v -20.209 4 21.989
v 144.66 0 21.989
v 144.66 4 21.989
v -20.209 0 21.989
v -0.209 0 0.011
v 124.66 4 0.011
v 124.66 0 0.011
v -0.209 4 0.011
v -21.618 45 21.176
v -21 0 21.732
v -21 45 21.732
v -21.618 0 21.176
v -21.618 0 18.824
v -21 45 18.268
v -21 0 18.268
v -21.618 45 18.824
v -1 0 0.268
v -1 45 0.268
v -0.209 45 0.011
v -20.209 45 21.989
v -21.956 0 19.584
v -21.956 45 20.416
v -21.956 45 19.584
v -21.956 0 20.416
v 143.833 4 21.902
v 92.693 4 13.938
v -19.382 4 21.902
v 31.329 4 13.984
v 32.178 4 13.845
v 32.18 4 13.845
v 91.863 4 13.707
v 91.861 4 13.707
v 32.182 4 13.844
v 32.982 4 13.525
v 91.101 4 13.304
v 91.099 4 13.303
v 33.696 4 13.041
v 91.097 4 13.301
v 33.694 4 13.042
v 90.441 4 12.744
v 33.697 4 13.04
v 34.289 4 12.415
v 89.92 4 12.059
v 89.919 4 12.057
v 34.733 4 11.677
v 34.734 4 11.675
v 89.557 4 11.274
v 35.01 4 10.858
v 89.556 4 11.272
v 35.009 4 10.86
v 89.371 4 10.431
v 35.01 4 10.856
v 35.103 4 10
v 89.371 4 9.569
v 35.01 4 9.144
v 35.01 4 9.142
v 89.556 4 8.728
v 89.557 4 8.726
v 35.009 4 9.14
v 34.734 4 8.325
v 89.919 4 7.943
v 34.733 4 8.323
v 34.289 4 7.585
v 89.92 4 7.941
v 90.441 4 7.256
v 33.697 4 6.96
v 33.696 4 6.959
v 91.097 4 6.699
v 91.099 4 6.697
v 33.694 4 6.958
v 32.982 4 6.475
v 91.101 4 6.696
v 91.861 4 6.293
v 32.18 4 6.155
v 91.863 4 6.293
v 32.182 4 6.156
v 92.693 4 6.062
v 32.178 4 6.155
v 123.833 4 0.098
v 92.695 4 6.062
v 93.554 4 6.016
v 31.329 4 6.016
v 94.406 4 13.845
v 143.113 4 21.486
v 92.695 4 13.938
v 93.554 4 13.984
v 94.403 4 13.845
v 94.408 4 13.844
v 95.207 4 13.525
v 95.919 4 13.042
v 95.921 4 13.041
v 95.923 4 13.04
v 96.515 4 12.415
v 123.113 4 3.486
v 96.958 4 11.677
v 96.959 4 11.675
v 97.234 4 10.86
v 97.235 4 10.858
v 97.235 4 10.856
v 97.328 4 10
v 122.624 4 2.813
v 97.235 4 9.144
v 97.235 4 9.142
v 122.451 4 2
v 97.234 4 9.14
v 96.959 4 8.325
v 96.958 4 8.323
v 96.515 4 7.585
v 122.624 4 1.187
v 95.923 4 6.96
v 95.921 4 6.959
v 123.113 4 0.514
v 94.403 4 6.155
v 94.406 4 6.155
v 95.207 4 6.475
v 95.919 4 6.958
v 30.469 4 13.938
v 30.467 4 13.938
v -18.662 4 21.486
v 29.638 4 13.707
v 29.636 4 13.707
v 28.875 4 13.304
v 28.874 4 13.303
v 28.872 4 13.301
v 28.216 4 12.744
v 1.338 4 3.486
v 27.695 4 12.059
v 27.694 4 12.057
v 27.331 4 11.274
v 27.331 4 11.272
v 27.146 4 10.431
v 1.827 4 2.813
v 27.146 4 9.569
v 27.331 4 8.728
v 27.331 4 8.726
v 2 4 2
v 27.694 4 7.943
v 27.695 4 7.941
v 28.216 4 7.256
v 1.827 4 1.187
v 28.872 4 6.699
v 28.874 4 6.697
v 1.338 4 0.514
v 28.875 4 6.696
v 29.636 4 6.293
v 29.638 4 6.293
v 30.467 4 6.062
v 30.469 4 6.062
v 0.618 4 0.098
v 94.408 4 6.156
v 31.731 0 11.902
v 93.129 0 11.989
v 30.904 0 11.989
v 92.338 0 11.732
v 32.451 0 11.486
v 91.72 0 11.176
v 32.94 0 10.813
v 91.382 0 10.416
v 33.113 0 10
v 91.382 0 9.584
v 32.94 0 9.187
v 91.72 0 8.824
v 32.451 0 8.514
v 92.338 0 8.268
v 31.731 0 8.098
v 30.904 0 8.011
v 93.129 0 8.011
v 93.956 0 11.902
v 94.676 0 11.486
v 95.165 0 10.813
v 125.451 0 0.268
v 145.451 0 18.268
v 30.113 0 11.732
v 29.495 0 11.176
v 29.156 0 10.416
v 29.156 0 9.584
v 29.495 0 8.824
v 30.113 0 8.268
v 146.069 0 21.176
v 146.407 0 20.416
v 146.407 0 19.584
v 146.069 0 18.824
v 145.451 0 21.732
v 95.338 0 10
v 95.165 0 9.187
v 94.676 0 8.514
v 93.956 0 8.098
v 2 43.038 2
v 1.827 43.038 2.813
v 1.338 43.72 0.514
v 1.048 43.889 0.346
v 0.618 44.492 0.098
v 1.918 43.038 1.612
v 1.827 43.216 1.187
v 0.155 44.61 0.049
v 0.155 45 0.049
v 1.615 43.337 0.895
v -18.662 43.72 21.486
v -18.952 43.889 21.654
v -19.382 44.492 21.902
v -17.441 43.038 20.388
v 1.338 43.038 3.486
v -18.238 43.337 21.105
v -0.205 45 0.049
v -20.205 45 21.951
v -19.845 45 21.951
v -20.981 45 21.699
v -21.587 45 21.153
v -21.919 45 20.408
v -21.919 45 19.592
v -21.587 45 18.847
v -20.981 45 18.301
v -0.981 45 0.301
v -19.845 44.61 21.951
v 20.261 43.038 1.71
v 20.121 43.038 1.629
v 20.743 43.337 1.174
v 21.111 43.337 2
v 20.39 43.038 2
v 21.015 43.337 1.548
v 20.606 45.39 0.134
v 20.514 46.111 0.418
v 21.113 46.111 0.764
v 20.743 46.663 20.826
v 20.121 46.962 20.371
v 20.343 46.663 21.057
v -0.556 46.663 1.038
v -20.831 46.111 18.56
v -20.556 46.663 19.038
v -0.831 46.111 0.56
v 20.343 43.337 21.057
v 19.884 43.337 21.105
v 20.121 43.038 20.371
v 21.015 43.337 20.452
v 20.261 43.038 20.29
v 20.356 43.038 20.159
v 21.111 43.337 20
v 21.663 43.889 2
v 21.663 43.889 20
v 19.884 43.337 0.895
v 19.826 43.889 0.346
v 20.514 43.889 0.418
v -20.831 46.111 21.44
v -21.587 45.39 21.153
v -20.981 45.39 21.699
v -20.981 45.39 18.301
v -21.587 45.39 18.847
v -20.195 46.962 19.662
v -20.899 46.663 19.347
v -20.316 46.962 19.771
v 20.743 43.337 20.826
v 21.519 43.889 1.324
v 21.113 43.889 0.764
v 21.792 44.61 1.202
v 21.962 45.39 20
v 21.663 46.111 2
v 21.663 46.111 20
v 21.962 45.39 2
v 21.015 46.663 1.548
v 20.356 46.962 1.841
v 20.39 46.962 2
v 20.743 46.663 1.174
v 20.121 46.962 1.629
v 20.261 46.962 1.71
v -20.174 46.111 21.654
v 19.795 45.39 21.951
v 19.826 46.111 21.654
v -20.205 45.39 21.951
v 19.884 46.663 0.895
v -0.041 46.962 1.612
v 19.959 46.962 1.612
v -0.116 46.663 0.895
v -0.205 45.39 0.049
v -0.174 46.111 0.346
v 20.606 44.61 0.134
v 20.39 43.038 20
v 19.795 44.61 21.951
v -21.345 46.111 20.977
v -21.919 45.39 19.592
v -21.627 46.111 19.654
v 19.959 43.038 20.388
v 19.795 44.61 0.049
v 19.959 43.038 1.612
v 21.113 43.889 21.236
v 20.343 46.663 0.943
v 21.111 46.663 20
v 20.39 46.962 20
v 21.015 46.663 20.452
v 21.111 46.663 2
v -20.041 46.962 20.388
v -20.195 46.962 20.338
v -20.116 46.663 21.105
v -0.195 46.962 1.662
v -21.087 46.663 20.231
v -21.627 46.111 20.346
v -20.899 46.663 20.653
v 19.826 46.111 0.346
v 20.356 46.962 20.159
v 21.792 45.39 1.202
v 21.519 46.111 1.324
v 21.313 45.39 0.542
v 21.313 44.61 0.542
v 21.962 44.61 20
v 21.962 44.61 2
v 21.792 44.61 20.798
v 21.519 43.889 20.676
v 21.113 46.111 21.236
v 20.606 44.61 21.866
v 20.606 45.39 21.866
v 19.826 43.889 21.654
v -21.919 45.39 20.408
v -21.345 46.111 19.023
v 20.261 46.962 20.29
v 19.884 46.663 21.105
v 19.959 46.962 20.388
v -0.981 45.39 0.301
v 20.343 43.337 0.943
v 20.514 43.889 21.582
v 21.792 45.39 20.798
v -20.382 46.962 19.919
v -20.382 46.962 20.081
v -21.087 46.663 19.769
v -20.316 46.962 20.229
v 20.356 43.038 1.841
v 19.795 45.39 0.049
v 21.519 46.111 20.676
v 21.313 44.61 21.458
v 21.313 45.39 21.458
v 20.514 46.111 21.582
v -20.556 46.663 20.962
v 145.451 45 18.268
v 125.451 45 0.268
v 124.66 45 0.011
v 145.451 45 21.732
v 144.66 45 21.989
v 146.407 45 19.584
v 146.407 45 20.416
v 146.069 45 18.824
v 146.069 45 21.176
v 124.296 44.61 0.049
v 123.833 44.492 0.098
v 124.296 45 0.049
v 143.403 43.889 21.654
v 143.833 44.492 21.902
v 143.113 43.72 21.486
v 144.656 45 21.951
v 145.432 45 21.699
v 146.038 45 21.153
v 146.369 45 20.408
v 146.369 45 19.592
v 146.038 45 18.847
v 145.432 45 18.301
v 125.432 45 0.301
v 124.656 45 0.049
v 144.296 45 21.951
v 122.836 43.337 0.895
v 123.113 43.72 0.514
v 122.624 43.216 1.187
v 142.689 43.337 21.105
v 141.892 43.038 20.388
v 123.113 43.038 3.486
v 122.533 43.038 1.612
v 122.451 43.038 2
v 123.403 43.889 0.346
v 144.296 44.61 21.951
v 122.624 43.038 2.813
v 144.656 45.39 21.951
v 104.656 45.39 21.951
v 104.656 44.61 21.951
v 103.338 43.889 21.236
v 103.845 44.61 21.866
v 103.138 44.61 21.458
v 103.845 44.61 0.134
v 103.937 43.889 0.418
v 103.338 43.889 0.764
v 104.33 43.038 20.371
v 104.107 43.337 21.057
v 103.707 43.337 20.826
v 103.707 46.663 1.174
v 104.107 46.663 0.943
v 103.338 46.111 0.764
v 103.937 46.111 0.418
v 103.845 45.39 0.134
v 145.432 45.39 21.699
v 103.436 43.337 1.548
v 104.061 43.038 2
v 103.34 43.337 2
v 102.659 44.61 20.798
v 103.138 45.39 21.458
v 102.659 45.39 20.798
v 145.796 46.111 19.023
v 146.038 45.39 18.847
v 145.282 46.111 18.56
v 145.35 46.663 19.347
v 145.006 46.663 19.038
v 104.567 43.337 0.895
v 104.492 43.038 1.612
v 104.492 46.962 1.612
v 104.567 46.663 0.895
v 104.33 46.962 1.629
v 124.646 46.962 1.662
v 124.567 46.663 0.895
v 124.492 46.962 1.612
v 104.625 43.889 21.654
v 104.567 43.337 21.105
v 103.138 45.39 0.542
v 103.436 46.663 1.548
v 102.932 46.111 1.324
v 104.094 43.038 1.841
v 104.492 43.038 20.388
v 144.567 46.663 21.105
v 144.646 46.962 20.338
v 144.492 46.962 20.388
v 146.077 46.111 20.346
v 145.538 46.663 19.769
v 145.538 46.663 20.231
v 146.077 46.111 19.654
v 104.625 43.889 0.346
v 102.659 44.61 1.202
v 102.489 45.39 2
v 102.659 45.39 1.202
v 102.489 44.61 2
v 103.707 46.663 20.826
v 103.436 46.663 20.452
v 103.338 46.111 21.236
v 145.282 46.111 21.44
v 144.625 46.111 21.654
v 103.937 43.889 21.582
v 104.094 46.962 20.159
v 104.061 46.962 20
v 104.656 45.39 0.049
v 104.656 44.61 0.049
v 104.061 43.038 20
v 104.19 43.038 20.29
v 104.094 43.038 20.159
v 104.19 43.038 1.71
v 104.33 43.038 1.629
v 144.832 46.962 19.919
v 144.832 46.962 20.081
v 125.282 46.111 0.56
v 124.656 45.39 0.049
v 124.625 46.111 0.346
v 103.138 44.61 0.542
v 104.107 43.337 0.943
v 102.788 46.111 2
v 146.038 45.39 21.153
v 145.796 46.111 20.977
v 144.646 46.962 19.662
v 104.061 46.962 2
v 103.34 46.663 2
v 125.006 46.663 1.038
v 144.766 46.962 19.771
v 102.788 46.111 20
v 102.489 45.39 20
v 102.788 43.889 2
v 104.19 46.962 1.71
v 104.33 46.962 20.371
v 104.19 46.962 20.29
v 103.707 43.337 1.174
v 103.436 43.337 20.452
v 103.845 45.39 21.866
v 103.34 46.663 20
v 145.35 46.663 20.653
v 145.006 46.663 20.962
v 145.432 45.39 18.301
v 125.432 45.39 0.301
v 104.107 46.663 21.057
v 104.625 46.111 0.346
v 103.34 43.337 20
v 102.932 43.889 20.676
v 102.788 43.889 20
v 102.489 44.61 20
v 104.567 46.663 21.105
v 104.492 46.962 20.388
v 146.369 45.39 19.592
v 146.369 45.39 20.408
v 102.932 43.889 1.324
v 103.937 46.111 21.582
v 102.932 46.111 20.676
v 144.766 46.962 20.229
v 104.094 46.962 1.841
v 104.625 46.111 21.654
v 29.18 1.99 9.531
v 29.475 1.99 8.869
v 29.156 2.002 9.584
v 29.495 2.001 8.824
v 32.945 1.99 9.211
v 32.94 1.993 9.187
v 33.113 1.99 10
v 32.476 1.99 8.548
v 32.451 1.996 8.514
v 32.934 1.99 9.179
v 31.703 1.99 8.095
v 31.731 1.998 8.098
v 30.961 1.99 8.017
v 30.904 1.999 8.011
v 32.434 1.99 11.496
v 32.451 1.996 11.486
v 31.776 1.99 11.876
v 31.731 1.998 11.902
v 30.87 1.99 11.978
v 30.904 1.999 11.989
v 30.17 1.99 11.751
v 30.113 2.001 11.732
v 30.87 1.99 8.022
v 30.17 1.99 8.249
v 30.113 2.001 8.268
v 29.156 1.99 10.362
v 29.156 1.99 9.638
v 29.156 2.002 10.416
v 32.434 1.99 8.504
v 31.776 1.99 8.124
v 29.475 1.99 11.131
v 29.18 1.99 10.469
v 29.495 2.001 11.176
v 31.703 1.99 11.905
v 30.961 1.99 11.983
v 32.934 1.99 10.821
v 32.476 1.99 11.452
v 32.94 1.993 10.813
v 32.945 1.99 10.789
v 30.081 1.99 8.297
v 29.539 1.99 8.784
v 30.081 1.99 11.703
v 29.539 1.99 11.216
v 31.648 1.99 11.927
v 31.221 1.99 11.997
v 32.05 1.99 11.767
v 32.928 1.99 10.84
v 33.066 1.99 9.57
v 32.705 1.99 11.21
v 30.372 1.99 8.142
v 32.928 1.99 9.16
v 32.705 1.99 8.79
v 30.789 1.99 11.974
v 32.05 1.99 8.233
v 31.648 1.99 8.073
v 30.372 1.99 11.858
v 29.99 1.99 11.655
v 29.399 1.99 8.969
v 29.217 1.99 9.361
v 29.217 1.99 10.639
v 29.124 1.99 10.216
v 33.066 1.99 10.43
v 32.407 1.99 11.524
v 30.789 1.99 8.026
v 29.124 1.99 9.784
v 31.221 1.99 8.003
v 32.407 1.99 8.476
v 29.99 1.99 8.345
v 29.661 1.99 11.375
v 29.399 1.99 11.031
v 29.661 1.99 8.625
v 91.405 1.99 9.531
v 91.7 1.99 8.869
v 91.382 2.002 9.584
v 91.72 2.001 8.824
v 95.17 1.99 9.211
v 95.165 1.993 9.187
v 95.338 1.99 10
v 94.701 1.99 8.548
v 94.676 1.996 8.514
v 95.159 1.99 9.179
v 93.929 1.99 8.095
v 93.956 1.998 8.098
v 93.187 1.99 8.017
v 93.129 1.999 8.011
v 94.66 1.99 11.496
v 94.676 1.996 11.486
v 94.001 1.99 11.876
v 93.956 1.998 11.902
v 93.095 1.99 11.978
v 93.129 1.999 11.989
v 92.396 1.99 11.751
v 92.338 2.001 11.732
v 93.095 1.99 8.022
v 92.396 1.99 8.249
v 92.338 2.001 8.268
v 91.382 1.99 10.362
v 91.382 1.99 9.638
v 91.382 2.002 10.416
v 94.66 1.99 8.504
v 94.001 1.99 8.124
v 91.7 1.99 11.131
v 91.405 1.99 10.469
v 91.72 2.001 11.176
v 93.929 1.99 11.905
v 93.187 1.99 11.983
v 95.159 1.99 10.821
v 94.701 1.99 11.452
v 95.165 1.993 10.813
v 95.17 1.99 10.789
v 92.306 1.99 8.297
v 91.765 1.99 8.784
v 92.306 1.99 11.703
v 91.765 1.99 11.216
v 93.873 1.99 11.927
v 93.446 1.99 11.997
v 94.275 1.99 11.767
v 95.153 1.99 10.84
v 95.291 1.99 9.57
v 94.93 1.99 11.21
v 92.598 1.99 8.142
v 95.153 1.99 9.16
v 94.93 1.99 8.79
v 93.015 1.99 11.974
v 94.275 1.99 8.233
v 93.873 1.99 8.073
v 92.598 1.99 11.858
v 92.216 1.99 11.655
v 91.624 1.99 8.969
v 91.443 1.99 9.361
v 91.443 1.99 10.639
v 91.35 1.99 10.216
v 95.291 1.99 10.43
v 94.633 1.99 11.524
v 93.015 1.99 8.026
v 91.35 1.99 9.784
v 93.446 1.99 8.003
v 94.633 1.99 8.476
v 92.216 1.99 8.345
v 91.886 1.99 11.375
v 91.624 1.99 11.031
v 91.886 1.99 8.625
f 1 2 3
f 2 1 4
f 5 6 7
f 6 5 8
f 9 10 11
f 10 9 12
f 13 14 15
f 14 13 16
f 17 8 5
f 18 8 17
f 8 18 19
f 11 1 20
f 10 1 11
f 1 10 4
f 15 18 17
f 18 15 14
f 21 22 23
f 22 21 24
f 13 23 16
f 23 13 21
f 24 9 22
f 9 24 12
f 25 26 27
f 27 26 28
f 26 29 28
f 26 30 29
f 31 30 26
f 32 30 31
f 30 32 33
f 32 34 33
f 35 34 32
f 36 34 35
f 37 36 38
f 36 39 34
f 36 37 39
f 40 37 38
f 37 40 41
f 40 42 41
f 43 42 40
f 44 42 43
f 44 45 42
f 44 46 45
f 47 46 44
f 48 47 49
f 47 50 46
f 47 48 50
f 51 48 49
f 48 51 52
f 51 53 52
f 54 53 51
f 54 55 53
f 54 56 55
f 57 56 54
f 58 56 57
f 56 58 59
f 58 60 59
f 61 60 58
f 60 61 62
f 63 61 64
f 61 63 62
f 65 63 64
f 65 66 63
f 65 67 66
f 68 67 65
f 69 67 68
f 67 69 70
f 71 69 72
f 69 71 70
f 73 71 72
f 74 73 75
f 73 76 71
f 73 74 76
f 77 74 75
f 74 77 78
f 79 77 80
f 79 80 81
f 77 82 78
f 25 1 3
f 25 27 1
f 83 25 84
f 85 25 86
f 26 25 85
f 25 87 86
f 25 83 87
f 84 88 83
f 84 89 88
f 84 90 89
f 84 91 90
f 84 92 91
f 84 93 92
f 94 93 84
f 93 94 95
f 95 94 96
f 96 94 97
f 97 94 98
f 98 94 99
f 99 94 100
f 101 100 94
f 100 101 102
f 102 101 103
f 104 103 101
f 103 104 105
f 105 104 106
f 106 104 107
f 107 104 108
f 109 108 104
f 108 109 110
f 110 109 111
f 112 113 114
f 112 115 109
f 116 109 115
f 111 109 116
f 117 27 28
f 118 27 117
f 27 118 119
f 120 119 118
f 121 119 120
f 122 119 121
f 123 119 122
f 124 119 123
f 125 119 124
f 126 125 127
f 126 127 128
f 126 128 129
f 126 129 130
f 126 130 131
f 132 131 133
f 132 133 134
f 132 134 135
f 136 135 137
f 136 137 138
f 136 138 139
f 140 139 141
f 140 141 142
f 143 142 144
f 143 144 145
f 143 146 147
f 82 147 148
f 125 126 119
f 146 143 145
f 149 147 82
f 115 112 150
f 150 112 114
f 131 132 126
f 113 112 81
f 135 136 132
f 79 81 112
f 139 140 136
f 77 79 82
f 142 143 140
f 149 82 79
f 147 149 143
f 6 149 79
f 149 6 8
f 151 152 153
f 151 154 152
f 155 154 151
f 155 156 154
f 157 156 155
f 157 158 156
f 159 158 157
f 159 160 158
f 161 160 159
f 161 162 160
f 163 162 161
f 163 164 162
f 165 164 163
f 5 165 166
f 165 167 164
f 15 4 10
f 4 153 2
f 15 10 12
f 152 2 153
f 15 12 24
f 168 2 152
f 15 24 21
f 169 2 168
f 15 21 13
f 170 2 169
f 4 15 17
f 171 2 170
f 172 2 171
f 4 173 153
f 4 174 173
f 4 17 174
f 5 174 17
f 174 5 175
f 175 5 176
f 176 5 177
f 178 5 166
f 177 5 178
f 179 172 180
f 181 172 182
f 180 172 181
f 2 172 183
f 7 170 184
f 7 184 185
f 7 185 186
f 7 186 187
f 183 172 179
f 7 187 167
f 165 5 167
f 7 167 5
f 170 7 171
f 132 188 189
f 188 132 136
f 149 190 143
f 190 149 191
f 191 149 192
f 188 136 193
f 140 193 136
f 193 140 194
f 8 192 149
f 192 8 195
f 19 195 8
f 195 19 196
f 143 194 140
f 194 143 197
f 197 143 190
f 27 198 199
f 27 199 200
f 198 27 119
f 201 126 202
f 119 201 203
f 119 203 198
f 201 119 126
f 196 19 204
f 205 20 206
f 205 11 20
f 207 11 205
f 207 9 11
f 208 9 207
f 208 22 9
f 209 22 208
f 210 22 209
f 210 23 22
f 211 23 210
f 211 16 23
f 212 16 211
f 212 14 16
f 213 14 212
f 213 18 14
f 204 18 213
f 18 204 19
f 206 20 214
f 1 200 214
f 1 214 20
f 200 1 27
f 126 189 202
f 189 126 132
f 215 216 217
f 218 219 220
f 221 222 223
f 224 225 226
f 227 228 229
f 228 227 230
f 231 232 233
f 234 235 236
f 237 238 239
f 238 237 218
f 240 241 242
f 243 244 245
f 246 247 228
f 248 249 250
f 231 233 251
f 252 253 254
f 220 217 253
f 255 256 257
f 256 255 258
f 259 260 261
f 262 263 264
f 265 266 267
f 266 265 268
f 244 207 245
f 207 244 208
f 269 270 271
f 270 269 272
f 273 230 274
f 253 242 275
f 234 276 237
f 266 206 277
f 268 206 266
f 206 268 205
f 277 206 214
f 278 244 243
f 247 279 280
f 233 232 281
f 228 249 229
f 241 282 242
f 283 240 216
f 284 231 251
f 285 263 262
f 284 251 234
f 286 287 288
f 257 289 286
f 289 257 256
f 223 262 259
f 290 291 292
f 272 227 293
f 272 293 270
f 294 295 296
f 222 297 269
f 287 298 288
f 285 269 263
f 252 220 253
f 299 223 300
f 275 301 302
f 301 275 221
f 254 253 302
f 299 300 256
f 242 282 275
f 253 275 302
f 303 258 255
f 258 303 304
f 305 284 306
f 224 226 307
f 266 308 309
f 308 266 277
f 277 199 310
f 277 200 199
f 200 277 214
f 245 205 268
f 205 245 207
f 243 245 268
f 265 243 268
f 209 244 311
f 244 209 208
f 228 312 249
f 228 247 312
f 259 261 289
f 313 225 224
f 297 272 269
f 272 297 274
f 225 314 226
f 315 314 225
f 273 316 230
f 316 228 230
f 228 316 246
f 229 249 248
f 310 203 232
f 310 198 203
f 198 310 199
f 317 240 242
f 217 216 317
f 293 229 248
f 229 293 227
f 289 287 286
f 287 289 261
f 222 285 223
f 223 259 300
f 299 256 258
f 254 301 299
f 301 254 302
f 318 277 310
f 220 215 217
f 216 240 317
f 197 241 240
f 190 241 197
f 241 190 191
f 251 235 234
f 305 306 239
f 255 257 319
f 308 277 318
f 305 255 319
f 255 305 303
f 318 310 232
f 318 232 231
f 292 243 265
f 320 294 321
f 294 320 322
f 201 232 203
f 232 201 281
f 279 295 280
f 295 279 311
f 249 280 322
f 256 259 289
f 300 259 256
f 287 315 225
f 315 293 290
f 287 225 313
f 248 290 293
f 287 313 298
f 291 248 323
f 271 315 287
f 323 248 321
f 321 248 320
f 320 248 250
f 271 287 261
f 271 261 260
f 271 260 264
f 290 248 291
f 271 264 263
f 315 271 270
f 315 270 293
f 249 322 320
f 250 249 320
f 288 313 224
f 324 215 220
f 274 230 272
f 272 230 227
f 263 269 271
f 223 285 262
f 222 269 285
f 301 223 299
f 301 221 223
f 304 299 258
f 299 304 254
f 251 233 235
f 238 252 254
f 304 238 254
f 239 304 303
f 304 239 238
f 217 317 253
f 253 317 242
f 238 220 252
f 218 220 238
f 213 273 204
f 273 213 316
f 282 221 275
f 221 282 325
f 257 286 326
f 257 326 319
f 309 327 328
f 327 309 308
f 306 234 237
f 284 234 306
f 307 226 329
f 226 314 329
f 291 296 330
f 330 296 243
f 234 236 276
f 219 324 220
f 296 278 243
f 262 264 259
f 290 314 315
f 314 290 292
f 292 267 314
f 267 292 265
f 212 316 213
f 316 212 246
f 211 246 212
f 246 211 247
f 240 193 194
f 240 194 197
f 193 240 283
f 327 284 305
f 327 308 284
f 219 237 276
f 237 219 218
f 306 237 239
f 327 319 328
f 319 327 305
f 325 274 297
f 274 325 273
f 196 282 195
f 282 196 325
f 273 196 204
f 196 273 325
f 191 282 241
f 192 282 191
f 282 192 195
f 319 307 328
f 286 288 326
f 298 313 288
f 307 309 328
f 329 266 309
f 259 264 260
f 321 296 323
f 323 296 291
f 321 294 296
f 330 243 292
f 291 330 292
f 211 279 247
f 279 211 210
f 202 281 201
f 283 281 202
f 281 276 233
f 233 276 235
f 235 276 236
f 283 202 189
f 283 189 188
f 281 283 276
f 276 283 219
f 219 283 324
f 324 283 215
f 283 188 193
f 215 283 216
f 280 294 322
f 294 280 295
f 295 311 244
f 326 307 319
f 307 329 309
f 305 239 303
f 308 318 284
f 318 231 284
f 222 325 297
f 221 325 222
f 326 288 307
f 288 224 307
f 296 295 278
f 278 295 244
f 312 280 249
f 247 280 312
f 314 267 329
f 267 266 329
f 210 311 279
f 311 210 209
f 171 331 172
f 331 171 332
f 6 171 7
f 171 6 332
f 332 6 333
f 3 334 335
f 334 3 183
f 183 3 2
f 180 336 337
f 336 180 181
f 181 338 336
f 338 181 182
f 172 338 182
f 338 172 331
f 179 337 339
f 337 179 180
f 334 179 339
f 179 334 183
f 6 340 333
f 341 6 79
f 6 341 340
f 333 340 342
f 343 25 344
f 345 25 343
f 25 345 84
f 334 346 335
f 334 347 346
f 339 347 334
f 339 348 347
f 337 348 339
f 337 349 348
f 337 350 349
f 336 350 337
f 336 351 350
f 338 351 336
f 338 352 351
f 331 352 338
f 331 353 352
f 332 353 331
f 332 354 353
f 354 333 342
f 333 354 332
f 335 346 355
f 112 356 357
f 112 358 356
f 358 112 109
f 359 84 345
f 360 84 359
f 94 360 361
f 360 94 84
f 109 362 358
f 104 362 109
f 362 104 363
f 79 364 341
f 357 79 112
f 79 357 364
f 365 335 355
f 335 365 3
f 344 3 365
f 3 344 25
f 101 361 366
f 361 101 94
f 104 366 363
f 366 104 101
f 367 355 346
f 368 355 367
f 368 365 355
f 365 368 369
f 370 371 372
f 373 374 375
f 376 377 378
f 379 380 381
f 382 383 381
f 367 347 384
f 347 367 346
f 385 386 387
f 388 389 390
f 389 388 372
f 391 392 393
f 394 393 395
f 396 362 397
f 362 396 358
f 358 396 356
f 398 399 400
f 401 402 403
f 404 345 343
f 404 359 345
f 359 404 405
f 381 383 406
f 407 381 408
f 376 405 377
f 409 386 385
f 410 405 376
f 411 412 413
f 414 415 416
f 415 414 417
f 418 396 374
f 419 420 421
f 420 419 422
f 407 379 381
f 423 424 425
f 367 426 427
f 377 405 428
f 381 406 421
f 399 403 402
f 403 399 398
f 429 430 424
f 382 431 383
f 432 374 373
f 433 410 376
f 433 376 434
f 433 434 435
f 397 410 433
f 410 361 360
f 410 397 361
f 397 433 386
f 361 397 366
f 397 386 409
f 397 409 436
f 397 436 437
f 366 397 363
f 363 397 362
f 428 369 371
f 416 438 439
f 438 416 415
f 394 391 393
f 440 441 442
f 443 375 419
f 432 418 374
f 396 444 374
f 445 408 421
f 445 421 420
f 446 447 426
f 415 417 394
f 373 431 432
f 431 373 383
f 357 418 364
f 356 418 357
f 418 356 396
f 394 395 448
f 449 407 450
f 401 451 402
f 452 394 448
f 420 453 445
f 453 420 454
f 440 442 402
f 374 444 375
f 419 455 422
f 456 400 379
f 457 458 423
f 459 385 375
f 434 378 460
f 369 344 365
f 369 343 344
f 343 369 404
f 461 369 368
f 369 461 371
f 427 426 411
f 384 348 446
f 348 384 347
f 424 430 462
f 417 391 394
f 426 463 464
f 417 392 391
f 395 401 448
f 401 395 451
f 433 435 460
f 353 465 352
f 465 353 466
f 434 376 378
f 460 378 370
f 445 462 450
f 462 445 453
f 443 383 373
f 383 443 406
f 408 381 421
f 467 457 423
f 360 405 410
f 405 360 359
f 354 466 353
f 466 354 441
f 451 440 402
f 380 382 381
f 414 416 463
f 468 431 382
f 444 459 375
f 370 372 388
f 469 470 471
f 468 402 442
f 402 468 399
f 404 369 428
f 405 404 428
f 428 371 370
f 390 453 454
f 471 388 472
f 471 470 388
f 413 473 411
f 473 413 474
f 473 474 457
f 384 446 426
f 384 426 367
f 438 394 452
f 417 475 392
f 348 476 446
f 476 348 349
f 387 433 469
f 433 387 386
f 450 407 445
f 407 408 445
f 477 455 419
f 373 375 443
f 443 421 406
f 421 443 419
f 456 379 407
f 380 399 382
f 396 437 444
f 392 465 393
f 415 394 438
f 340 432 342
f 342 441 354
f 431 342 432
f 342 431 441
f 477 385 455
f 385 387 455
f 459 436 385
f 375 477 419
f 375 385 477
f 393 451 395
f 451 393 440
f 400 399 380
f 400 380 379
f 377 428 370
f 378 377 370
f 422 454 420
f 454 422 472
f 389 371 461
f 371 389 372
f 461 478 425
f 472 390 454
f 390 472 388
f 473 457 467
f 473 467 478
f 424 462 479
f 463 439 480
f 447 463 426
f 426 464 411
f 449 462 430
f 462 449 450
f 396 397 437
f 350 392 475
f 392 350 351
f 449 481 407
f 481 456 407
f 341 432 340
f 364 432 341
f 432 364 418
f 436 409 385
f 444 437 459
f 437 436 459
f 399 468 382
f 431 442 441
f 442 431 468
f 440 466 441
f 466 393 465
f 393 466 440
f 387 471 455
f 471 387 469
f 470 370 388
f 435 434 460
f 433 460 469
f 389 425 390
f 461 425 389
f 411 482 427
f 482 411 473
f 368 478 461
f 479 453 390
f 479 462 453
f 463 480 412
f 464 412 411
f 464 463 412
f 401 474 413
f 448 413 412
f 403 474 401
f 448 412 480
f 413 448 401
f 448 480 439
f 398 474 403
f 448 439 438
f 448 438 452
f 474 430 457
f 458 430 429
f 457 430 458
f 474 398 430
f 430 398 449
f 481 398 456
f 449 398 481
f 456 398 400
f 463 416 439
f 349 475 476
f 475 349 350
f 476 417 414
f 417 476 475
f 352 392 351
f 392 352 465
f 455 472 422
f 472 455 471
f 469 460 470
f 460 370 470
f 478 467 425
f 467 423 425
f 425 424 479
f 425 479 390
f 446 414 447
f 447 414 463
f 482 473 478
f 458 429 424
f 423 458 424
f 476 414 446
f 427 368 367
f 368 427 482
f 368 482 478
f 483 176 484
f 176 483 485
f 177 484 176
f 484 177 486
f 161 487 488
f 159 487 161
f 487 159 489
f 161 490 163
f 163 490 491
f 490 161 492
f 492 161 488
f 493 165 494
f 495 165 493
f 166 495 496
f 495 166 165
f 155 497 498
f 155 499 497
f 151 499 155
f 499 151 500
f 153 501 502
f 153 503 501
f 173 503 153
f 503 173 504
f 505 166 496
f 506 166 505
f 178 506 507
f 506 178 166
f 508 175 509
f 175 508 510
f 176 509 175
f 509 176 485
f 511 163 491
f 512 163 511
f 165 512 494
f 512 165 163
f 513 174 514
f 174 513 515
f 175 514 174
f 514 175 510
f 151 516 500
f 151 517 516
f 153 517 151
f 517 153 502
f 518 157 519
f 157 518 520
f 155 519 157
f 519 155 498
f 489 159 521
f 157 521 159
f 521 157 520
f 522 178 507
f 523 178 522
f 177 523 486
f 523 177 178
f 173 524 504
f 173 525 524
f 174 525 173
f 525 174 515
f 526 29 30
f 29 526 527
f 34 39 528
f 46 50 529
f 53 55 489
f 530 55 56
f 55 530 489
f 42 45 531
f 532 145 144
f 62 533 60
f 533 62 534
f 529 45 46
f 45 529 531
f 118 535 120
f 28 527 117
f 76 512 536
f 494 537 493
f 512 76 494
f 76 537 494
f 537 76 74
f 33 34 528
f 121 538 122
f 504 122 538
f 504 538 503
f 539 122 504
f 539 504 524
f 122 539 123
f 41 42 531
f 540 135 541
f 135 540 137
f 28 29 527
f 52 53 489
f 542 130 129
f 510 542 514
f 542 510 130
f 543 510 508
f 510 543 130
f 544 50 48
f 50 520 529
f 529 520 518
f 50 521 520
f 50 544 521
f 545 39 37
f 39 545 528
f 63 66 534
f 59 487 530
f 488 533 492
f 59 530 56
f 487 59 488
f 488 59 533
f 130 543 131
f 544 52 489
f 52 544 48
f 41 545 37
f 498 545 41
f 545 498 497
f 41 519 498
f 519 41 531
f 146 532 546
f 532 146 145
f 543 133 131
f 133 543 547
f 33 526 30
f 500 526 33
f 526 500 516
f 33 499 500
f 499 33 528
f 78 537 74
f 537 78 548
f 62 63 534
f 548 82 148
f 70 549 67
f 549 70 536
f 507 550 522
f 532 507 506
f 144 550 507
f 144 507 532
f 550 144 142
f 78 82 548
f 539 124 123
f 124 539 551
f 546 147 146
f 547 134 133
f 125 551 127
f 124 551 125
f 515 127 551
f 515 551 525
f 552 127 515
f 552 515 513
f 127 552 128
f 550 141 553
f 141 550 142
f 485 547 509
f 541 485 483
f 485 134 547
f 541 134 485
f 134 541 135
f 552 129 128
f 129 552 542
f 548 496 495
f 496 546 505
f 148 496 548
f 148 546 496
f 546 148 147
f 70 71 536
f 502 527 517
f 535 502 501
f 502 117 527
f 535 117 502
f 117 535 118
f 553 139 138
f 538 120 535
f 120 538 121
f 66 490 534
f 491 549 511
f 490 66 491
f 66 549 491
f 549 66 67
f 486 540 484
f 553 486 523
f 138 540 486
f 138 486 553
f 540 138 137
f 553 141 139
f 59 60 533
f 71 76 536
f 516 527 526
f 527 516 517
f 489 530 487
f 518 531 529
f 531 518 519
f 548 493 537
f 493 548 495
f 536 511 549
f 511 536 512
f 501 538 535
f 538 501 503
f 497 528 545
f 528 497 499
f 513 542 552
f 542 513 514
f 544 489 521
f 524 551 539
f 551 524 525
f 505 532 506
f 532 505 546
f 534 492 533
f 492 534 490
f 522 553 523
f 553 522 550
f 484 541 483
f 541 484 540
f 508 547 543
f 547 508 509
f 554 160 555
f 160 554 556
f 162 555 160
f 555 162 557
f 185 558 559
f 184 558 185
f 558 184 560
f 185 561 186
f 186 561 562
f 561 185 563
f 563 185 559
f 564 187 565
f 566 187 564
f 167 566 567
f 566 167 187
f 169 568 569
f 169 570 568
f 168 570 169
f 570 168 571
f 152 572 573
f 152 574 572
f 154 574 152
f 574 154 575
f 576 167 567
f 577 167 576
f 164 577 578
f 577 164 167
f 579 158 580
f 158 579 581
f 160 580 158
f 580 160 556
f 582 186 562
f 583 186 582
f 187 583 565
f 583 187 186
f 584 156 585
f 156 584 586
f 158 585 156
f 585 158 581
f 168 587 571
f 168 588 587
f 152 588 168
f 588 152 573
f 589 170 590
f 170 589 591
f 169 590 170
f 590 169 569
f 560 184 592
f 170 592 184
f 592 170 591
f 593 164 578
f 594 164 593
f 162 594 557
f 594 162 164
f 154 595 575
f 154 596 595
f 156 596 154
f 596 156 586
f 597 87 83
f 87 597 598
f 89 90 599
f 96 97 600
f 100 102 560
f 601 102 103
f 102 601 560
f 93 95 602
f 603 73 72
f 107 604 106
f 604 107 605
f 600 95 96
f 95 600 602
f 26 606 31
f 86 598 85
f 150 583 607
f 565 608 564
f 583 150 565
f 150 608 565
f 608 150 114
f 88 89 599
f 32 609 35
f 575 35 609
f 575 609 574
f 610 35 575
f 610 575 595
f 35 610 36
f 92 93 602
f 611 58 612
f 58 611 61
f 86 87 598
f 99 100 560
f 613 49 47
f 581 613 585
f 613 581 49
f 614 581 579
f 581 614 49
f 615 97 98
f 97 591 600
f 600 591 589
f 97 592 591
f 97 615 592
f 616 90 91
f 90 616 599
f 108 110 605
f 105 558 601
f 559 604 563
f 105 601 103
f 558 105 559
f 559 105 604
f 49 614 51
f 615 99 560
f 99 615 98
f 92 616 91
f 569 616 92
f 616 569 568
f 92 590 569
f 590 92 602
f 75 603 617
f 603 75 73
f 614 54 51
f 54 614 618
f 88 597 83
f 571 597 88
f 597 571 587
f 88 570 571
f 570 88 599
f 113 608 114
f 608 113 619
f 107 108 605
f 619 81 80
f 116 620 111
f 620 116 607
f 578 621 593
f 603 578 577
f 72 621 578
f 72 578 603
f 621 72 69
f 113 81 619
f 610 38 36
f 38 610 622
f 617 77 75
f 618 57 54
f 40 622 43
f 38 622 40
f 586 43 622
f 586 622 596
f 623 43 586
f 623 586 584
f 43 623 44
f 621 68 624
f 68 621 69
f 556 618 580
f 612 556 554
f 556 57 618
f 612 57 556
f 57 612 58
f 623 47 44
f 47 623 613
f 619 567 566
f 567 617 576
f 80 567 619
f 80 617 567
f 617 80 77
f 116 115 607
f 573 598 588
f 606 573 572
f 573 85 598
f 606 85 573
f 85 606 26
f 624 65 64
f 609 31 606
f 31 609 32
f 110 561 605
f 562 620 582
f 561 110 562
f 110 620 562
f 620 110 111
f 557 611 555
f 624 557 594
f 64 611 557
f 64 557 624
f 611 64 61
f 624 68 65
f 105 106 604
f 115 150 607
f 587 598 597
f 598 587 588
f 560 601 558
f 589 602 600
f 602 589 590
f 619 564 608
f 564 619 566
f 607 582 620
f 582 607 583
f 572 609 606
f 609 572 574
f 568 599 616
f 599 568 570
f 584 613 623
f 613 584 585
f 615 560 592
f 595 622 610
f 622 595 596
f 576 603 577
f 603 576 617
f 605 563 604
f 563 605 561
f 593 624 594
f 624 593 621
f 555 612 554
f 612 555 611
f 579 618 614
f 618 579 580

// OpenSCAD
// file: libs/rounded_shapes.scad
$fa = 1;
$fs = 1.75 / 2;

module rounded_square(width, height, border_radius) {
    translate([border_radius, border_radius])
    minkowski() {
        border_diameter = border_radius * 2;

        square(
            size = [
                width - border_diameter,
                height - border_diameter
            ]
        );
        circle(r = border_radius);
    }
}
// main file
include<libs/rounded_shapes.scad>;

$fa = 1;
$fs = 1.75 / 2;

lid_height = 38;
lid_diameter = 176;
wall_thickness = 4;
lip_width = 20;

screw_hole_size = 4;

lid_radius = lid_diameter / 2;
holder_height = 20;
holder_top_width = sqrt((lid_radius ^ 2) * 2);
holder_depth = lid_height + 5;
intersection_angle = acos((holder_top_width / 2) / lid_radius);
side_top_offset = holder_height * tan(intersection_angle);
holder_bottom_width = holder_top_width - side_top_offset;
screw_hole_radius = screw_hole_size / 2;

module render_half() {
    // Back piece
    hull() {
        translate([0, 0, wall_thickness / 2])
        rotate([-90, 0, 0])
        cylinder(h = wall_thickness, r = wall_thickness / 2);

        translate([-side_top_offset, 0, holder_height])
        rotate([-90, 0, 0])
        cylinder(h = wall_thickness, r = wall_thickness / 2);

        translate([holder_top_width / 2 + wall_thickness, 0, holder_height])
        rotate([-90, 0, 0])
        cylinder(h = wall_thickness, r = wall_thickness / 2);

        translate([holder_top_width / 2 + wall_thickness, 0, wall_thickness / 2])
        rotate([-90, 0, 0])
        cylinder(h = wall_thickness, r = wall_thickness / 2);
    }

    // Side
    hull() {
        translate([0, 0, wall_thickness / 2])
        rotate([-90, 0, 0])
        cylinder(h = holder_depth + wall_thickness / 2, r = wall_thickness / 2);

        translate([-side_top_offset, 0, holder_height])
        rotate([-90, 0, 0])
        cylinder(h = holder_depth + wall_thickness / 2, r = wall_thickness / 2);
    }

    // Lip
    hull() {
        translate([0, holder_depth + wall_thickness / 2, wall_thickness / 2])
        rotate([-90, 0, 0])
        sphere(d = wall_thickness);

        translate([-side_top_offset, holder_depth + wall_thickness / 2, holder_height])
        rotate([-90, 0, 0])
        sphere(d = wall_thickness);

        translate([lip_width, holder_depth + wall_thickness / 2, holder_height])
        rotate([-90, 0, 0])
        sphere(d = wall_thickness);

        translate([lip_width, holder_depth + wall_thickness / 2, wall_thickness / 2])
        rotate([-90, 0, 0])
        sphere(d = wall_thickness);
    }
}

difference() {
    union() {
        render_half();

        translate([holder_top_width, 0, 0])
        mirror([1, 0, 0])
        render_half();
    }

    // Screw holes
    translate([holder_top_width / 4, -0.01 , holder_height / 2])
    rotate([-90, 0, 0])
    union() {
        cylinder(h = wall_thickness / 2 + 0.02, r = screw_hole_radius);
        translate([0, 0, wall_thickness / 2])
        cylinder(h = wall_thickness / 2 + 0.02, r1 = screw_hole_radius, r2 = screw_hole_radius  * 2);
    }

    translate([(holder_top_width / 4) * 3, -0.01 , holder_height / 2])
    rotate([-90, 0, 0])
    union() {
        cylinder(h = wall_thickness / 2 + 0.02, r = screw_hole_radius);
        translate([0, 0, wall_thickness / 2])
        cylinder(h = wall_thickness / 2 + 0.02, r1 = screw_hole_radius, r2 = screw_hole_radius  * 2);
    }
}
